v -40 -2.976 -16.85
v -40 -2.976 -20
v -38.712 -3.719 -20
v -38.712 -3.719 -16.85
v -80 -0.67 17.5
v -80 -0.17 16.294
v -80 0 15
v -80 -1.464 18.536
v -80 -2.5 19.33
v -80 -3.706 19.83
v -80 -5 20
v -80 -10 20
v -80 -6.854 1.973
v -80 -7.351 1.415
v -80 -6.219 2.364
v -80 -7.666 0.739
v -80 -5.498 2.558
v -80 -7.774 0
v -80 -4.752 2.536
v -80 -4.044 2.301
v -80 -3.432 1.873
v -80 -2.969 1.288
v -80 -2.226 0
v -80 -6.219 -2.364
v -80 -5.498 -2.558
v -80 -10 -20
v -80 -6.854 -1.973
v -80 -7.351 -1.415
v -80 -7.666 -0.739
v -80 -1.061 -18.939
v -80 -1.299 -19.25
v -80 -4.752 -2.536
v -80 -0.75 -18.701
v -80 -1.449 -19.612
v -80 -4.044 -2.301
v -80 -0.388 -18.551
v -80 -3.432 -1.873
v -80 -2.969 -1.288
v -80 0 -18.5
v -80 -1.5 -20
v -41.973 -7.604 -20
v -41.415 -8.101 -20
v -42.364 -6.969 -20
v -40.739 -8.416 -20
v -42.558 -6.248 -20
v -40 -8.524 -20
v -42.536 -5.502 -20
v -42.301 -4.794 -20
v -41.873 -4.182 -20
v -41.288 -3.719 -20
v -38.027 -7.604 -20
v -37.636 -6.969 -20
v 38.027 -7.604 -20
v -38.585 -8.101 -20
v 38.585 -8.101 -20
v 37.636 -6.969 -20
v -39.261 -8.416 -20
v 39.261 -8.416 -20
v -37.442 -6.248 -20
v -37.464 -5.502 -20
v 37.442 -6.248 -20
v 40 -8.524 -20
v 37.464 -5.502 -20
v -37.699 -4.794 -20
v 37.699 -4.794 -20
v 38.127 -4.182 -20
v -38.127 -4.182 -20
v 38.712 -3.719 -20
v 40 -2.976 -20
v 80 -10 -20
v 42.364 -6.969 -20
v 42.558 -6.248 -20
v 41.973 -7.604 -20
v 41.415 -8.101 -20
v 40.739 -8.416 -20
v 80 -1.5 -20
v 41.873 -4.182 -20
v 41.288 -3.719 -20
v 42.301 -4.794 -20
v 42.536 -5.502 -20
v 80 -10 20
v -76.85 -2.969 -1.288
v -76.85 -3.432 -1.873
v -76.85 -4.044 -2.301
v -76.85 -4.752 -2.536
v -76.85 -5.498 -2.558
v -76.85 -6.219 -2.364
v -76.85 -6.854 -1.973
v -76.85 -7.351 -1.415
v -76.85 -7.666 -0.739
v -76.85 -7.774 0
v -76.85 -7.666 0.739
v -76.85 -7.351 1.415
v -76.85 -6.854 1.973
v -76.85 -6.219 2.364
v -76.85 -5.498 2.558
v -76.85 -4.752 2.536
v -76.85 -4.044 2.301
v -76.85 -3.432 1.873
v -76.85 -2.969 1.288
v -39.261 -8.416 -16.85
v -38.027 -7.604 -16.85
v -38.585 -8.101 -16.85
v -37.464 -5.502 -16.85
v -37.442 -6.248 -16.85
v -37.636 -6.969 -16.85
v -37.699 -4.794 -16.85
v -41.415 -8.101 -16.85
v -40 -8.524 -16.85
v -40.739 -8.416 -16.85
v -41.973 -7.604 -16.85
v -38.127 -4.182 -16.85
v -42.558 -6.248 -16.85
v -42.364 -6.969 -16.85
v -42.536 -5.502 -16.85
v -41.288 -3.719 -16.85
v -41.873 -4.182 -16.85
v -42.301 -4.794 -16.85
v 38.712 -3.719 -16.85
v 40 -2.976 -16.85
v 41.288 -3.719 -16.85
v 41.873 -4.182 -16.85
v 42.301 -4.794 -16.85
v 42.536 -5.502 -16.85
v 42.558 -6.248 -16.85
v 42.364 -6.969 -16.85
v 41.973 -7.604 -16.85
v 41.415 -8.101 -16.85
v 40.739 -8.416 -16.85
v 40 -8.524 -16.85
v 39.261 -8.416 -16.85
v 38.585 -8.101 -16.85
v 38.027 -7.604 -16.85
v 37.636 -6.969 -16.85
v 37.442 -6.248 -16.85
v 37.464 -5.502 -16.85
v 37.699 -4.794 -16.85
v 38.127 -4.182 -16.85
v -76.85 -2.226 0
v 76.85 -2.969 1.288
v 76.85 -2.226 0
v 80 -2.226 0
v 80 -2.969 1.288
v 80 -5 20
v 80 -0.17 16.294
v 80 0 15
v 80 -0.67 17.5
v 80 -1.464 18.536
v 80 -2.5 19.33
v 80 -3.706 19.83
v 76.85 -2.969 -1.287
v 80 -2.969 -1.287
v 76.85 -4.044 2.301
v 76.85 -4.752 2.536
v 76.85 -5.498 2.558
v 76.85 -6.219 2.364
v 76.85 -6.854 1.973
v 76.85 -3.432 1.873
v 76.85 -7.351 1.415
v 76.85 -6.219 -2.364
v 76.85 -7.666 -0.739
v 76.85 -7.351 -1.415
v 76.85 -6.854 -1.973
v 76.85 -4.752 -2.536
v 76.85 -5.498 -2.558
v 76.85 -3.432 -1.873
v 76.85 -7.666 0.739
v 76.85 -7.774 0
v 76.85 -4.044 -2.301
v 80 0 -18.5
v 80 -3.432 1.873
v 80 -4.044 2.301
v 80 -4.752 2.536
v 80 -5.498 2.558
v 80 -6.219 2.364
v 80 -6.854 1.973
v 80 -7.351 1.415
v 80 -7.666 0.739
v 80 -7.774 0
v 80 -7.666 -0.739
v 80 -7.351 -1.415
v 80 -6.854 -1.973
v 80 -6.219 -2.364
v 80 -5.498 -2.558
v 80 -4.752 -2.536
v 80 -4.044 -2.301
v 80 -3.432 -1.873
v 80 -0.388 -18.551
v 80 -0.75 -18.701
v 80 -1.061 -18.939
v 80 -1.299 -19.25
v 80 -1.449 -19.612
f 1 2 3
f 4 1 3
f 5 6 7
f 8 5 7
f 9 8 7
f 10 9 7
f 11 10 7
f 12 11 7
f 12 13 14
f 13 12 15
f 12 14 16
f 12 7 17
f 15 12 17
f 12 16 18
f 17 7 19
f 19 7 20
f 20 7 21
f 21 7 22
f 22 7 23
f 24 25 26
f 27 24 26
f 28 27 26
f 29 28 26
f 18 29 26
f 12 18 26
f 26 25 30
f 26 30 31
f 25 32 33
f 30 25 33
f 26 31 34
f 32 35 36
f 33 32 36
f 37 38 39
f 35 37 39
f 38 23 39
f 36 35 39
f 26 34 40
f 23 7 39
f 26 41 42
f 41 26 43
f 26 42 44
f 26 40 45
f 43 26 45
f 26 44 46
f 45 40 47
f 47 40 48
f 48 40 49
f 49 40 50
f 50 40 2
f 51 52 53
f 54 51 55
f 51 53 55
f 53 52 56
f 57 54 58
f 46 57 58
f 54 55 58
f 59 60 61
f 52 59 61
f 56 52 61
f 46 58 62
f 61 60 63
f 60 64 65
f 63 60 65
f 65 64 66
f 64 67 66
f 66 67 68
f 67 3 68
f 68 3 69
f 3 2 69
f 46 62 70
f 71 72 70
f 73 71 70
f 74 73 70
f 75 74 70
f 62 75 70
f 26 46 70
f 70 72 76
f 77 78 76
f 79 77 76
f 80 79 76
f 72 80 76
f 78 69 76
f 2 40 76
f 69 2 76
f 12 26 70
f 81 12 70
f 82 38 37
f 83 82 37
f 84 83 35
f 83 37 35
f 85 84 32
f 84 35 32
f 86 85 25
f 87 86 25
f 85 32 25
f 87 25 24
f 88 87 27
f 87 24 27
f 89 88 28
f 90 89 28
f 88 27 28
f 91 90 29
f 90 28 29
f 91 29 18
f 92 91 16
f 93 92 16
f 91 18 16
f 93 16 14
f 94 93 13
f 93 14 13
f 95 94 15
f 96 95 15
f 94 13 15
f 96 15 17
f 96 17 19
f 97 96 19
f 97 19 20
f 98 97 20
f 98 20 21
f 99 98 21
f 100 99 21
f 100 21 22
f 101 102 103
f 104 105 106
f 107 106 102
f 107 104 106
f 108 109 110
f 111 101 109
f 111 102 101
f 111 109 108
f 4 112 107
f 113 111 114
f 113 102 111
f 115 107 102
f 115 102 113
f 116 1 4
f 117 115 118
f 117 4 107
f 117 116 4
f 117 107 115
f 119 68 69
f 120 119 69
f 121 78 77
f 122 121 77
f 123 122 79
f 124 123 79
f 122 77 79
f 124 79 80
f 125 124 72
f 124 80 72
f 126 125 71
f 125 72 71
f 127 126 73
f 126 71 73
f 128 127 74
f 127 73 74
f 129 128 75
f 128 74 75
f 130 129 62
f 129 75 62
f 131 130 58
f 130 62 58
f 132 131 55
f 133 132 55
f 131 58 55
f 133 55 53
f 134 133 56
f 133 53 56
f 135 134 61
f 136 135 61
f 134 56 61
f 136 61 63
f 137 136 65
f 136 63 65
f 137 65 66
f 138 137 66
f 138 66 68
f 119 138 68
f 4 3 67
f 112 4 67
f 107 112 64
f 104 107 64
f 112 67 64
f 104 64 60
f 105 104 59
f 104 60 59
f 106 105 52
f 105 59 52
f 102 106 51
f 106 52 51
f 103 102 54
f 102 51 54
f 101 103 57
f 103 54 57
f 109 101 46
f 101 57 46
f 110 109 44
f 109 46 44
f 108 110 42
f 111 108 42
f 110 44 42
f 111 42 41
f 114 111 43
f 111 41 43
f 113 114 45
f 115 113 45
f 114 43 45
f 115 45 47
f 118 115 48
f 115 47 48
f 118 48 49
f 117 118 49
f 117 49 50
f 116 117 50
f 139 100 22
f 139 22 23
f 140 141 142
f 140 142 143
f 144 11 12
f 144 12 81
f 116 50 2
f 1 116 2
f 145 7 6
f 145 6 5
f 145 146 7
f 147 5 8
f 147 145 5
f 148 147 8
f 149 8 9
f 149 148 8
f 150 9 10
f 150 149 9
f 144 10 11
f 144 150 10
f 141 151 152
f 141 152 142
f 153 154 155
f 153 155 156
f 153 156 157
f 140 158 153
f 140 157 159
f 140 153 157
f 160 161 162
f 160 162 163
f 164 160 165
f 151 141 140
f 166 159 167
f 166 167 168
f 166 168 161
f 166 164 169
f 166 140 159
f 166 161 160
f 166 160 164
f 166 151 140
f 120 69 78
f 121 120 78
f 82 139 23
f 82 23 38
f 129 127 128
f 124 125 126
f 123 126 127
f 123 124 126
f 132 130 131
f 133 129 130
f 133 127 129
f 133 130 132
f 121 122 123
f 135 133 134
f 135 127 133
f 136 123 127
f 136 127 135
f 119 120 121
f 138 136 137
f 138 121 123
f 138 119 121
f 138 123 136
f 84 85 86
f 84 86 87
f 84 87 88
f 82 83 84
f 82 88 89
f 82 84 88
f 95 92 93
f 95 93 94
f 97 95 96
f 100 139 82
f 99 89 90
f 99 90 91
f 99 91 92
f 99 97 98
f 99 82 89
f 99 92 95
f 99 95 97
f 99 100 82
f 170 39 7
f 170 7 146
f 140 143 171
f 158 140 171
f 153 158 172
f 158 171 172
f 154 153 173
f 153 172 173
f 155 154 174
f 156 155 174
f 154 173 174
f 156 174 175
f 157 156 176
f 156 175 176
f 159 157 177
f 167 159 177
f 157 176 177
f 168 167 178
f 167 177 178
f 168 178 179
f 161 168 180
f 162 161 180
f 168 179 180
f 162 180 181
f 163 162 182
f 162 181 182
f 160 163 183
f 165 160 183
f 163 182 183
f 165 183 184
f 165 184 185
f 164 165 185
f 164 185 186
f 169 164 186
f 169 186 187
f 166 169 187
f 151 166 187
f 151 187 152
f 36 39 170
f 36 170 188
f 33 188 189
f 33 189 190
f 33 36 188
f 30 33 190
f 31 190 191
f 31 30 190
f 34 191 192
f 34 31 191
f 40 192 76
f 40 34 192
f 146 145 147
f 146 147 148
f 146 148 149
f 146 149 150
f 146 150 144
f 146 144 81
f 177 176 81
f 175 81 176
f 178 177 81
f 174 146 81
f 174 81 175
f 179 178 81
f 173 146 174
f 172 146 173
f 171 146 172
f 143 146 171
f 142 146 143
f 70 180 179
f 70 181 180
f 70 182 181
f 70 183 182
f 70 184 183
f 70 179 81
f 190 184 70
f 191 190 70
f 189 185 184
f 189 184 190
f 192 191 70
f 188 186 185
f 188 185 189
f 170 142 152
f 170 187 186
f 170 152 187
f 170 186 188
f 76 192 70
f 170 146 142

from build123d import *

# Parameters (mm, degrees)
SKETCH_1_W               = 160
SKETCH_1_H               = 40
EXTRUDE_1_DEPTH          = 10
SWEEP_START              = -80
SWEEP_1_DEPTH            = 160
SKETCH_6_R               = 2.575
CUT_EXTRUDE_1_DEPTH      = 3.15
FILLET_1_R               = 5
SKETCH_7_R               = 2.575
CUT_EXTRUDE_2_DEPTH      = 3.15
PATTERN_CIRCULAR_1_COUNT = 2


# Read off the part's stored shape, not the designer's step: Вырез-По траектории1
with BuildPart() as part:
    # Эскиз1 → Бобышка-Вытянуть1 (new body)
    with BuildSketch(Plane(origin=(0, 0, 0), x_dir=(1, 0, 0), z_dir=(0, 1, 0))):
        Rectangle(SKETCH_1_W, SKETCH_1_H)
    extrude(amount=-EXTRUDE_1_DEPTH)

    # Вырез-По траектории1 outline → Вырез-По траектории1 (cut)
    with BuildSketch(Plane.YZ.offset(SWEEP_START)):
        with BuildLine():
            ThreePointArc((0, -18.5), (-1.060660172, -18.939339828), (-1.5, -20))
            Line((-1.5, -20), (0, -20))
            Line((0, -20), (0, -18.5))
        make_face()
    extrude(amount=SWEEP_1_DEPTH, mode=Mode.SUBTRACT)

    # Эскиз6 → Вырез-Вытянуть1 (cut)
    with BuildSketch(Plane(origin=(0, 0, -20), x_dir=(-1, 0, 0), z_dir=(0, 0, -1))):
        with Locations((-40, -5.949176943)):
            Circle(SKETCH_6_R)
        with BuildLine():
            Line((-40, -2.975823057), (-41.2875, -3.719161528))
            ThreePointArc((-41.2875, -3.719161528), (-40, -3.374176943), (-38.7125, -3.719161528))
            Line((-38.7125, -3.719161528), (-40, -2.975823057))
        make_face()
        with Locations((40, -5.949176943)):
            Circle(SKETCH_6_R)
        with BuildLine():
            ThreePointArc((38.7125, -3.719161528), (40, -3.374176943), (41.2875, -3.719161528))
            Line((41.2875, -3.719161528), (40, -2.975823057))
            Line((40, -2.975823057), (38.7125, -3.719161528))
        make_face()
    extrude(amount=-CUT_EXTRUDE_1_DEPTH, mode=Mode.SUBTRACT)

    # Скругление1
    fillet_1_edges = [part.edges().sort_by_distance(p)[0] for p in [
        (0, 0, 20),
    ]]
    fillet(fillet_1_edges, radius=FILLET_1_R)

    # Эскиз7 → Вырез-Вытянуть2 (cut)
    with BuildSketch(Plane.ZY.offset(80)):
        with Locations((0, -5.199176943)):
            Circle(SKETCH_7_R)
        with BuildLine():
            Line((1.2875, -2.969161528), (0, -2.225823057))
            Line((0, -2.225823057), (-1.2875, -2.969161528))
            ThreePointArc((-1.2875, -2.969161528), (0, -2.624176943), (1.2875, -2.969161528))
        make_face()
    cut_extrude_2 = extrude(amount=-CUT_EXTRUDE_2_DEPTH, mode=Mode.SUBTRACT)

    # Круговой массив1: Вырез-Вытянуть2 ×2 about axis
    pattern_circular_1_axis = Axis((0, 0, 0), (0, 1, 0))
    for i in range(1, PATTERN_CIRCULAR_1_COUNT):
        add(cut_extrude_2.rotate(pattern_circular_1_axis, i * 360 / PATTERN_CIRCULAR_1_COUNT), mode=Mode.SUBTRACT)


solid = part.part
